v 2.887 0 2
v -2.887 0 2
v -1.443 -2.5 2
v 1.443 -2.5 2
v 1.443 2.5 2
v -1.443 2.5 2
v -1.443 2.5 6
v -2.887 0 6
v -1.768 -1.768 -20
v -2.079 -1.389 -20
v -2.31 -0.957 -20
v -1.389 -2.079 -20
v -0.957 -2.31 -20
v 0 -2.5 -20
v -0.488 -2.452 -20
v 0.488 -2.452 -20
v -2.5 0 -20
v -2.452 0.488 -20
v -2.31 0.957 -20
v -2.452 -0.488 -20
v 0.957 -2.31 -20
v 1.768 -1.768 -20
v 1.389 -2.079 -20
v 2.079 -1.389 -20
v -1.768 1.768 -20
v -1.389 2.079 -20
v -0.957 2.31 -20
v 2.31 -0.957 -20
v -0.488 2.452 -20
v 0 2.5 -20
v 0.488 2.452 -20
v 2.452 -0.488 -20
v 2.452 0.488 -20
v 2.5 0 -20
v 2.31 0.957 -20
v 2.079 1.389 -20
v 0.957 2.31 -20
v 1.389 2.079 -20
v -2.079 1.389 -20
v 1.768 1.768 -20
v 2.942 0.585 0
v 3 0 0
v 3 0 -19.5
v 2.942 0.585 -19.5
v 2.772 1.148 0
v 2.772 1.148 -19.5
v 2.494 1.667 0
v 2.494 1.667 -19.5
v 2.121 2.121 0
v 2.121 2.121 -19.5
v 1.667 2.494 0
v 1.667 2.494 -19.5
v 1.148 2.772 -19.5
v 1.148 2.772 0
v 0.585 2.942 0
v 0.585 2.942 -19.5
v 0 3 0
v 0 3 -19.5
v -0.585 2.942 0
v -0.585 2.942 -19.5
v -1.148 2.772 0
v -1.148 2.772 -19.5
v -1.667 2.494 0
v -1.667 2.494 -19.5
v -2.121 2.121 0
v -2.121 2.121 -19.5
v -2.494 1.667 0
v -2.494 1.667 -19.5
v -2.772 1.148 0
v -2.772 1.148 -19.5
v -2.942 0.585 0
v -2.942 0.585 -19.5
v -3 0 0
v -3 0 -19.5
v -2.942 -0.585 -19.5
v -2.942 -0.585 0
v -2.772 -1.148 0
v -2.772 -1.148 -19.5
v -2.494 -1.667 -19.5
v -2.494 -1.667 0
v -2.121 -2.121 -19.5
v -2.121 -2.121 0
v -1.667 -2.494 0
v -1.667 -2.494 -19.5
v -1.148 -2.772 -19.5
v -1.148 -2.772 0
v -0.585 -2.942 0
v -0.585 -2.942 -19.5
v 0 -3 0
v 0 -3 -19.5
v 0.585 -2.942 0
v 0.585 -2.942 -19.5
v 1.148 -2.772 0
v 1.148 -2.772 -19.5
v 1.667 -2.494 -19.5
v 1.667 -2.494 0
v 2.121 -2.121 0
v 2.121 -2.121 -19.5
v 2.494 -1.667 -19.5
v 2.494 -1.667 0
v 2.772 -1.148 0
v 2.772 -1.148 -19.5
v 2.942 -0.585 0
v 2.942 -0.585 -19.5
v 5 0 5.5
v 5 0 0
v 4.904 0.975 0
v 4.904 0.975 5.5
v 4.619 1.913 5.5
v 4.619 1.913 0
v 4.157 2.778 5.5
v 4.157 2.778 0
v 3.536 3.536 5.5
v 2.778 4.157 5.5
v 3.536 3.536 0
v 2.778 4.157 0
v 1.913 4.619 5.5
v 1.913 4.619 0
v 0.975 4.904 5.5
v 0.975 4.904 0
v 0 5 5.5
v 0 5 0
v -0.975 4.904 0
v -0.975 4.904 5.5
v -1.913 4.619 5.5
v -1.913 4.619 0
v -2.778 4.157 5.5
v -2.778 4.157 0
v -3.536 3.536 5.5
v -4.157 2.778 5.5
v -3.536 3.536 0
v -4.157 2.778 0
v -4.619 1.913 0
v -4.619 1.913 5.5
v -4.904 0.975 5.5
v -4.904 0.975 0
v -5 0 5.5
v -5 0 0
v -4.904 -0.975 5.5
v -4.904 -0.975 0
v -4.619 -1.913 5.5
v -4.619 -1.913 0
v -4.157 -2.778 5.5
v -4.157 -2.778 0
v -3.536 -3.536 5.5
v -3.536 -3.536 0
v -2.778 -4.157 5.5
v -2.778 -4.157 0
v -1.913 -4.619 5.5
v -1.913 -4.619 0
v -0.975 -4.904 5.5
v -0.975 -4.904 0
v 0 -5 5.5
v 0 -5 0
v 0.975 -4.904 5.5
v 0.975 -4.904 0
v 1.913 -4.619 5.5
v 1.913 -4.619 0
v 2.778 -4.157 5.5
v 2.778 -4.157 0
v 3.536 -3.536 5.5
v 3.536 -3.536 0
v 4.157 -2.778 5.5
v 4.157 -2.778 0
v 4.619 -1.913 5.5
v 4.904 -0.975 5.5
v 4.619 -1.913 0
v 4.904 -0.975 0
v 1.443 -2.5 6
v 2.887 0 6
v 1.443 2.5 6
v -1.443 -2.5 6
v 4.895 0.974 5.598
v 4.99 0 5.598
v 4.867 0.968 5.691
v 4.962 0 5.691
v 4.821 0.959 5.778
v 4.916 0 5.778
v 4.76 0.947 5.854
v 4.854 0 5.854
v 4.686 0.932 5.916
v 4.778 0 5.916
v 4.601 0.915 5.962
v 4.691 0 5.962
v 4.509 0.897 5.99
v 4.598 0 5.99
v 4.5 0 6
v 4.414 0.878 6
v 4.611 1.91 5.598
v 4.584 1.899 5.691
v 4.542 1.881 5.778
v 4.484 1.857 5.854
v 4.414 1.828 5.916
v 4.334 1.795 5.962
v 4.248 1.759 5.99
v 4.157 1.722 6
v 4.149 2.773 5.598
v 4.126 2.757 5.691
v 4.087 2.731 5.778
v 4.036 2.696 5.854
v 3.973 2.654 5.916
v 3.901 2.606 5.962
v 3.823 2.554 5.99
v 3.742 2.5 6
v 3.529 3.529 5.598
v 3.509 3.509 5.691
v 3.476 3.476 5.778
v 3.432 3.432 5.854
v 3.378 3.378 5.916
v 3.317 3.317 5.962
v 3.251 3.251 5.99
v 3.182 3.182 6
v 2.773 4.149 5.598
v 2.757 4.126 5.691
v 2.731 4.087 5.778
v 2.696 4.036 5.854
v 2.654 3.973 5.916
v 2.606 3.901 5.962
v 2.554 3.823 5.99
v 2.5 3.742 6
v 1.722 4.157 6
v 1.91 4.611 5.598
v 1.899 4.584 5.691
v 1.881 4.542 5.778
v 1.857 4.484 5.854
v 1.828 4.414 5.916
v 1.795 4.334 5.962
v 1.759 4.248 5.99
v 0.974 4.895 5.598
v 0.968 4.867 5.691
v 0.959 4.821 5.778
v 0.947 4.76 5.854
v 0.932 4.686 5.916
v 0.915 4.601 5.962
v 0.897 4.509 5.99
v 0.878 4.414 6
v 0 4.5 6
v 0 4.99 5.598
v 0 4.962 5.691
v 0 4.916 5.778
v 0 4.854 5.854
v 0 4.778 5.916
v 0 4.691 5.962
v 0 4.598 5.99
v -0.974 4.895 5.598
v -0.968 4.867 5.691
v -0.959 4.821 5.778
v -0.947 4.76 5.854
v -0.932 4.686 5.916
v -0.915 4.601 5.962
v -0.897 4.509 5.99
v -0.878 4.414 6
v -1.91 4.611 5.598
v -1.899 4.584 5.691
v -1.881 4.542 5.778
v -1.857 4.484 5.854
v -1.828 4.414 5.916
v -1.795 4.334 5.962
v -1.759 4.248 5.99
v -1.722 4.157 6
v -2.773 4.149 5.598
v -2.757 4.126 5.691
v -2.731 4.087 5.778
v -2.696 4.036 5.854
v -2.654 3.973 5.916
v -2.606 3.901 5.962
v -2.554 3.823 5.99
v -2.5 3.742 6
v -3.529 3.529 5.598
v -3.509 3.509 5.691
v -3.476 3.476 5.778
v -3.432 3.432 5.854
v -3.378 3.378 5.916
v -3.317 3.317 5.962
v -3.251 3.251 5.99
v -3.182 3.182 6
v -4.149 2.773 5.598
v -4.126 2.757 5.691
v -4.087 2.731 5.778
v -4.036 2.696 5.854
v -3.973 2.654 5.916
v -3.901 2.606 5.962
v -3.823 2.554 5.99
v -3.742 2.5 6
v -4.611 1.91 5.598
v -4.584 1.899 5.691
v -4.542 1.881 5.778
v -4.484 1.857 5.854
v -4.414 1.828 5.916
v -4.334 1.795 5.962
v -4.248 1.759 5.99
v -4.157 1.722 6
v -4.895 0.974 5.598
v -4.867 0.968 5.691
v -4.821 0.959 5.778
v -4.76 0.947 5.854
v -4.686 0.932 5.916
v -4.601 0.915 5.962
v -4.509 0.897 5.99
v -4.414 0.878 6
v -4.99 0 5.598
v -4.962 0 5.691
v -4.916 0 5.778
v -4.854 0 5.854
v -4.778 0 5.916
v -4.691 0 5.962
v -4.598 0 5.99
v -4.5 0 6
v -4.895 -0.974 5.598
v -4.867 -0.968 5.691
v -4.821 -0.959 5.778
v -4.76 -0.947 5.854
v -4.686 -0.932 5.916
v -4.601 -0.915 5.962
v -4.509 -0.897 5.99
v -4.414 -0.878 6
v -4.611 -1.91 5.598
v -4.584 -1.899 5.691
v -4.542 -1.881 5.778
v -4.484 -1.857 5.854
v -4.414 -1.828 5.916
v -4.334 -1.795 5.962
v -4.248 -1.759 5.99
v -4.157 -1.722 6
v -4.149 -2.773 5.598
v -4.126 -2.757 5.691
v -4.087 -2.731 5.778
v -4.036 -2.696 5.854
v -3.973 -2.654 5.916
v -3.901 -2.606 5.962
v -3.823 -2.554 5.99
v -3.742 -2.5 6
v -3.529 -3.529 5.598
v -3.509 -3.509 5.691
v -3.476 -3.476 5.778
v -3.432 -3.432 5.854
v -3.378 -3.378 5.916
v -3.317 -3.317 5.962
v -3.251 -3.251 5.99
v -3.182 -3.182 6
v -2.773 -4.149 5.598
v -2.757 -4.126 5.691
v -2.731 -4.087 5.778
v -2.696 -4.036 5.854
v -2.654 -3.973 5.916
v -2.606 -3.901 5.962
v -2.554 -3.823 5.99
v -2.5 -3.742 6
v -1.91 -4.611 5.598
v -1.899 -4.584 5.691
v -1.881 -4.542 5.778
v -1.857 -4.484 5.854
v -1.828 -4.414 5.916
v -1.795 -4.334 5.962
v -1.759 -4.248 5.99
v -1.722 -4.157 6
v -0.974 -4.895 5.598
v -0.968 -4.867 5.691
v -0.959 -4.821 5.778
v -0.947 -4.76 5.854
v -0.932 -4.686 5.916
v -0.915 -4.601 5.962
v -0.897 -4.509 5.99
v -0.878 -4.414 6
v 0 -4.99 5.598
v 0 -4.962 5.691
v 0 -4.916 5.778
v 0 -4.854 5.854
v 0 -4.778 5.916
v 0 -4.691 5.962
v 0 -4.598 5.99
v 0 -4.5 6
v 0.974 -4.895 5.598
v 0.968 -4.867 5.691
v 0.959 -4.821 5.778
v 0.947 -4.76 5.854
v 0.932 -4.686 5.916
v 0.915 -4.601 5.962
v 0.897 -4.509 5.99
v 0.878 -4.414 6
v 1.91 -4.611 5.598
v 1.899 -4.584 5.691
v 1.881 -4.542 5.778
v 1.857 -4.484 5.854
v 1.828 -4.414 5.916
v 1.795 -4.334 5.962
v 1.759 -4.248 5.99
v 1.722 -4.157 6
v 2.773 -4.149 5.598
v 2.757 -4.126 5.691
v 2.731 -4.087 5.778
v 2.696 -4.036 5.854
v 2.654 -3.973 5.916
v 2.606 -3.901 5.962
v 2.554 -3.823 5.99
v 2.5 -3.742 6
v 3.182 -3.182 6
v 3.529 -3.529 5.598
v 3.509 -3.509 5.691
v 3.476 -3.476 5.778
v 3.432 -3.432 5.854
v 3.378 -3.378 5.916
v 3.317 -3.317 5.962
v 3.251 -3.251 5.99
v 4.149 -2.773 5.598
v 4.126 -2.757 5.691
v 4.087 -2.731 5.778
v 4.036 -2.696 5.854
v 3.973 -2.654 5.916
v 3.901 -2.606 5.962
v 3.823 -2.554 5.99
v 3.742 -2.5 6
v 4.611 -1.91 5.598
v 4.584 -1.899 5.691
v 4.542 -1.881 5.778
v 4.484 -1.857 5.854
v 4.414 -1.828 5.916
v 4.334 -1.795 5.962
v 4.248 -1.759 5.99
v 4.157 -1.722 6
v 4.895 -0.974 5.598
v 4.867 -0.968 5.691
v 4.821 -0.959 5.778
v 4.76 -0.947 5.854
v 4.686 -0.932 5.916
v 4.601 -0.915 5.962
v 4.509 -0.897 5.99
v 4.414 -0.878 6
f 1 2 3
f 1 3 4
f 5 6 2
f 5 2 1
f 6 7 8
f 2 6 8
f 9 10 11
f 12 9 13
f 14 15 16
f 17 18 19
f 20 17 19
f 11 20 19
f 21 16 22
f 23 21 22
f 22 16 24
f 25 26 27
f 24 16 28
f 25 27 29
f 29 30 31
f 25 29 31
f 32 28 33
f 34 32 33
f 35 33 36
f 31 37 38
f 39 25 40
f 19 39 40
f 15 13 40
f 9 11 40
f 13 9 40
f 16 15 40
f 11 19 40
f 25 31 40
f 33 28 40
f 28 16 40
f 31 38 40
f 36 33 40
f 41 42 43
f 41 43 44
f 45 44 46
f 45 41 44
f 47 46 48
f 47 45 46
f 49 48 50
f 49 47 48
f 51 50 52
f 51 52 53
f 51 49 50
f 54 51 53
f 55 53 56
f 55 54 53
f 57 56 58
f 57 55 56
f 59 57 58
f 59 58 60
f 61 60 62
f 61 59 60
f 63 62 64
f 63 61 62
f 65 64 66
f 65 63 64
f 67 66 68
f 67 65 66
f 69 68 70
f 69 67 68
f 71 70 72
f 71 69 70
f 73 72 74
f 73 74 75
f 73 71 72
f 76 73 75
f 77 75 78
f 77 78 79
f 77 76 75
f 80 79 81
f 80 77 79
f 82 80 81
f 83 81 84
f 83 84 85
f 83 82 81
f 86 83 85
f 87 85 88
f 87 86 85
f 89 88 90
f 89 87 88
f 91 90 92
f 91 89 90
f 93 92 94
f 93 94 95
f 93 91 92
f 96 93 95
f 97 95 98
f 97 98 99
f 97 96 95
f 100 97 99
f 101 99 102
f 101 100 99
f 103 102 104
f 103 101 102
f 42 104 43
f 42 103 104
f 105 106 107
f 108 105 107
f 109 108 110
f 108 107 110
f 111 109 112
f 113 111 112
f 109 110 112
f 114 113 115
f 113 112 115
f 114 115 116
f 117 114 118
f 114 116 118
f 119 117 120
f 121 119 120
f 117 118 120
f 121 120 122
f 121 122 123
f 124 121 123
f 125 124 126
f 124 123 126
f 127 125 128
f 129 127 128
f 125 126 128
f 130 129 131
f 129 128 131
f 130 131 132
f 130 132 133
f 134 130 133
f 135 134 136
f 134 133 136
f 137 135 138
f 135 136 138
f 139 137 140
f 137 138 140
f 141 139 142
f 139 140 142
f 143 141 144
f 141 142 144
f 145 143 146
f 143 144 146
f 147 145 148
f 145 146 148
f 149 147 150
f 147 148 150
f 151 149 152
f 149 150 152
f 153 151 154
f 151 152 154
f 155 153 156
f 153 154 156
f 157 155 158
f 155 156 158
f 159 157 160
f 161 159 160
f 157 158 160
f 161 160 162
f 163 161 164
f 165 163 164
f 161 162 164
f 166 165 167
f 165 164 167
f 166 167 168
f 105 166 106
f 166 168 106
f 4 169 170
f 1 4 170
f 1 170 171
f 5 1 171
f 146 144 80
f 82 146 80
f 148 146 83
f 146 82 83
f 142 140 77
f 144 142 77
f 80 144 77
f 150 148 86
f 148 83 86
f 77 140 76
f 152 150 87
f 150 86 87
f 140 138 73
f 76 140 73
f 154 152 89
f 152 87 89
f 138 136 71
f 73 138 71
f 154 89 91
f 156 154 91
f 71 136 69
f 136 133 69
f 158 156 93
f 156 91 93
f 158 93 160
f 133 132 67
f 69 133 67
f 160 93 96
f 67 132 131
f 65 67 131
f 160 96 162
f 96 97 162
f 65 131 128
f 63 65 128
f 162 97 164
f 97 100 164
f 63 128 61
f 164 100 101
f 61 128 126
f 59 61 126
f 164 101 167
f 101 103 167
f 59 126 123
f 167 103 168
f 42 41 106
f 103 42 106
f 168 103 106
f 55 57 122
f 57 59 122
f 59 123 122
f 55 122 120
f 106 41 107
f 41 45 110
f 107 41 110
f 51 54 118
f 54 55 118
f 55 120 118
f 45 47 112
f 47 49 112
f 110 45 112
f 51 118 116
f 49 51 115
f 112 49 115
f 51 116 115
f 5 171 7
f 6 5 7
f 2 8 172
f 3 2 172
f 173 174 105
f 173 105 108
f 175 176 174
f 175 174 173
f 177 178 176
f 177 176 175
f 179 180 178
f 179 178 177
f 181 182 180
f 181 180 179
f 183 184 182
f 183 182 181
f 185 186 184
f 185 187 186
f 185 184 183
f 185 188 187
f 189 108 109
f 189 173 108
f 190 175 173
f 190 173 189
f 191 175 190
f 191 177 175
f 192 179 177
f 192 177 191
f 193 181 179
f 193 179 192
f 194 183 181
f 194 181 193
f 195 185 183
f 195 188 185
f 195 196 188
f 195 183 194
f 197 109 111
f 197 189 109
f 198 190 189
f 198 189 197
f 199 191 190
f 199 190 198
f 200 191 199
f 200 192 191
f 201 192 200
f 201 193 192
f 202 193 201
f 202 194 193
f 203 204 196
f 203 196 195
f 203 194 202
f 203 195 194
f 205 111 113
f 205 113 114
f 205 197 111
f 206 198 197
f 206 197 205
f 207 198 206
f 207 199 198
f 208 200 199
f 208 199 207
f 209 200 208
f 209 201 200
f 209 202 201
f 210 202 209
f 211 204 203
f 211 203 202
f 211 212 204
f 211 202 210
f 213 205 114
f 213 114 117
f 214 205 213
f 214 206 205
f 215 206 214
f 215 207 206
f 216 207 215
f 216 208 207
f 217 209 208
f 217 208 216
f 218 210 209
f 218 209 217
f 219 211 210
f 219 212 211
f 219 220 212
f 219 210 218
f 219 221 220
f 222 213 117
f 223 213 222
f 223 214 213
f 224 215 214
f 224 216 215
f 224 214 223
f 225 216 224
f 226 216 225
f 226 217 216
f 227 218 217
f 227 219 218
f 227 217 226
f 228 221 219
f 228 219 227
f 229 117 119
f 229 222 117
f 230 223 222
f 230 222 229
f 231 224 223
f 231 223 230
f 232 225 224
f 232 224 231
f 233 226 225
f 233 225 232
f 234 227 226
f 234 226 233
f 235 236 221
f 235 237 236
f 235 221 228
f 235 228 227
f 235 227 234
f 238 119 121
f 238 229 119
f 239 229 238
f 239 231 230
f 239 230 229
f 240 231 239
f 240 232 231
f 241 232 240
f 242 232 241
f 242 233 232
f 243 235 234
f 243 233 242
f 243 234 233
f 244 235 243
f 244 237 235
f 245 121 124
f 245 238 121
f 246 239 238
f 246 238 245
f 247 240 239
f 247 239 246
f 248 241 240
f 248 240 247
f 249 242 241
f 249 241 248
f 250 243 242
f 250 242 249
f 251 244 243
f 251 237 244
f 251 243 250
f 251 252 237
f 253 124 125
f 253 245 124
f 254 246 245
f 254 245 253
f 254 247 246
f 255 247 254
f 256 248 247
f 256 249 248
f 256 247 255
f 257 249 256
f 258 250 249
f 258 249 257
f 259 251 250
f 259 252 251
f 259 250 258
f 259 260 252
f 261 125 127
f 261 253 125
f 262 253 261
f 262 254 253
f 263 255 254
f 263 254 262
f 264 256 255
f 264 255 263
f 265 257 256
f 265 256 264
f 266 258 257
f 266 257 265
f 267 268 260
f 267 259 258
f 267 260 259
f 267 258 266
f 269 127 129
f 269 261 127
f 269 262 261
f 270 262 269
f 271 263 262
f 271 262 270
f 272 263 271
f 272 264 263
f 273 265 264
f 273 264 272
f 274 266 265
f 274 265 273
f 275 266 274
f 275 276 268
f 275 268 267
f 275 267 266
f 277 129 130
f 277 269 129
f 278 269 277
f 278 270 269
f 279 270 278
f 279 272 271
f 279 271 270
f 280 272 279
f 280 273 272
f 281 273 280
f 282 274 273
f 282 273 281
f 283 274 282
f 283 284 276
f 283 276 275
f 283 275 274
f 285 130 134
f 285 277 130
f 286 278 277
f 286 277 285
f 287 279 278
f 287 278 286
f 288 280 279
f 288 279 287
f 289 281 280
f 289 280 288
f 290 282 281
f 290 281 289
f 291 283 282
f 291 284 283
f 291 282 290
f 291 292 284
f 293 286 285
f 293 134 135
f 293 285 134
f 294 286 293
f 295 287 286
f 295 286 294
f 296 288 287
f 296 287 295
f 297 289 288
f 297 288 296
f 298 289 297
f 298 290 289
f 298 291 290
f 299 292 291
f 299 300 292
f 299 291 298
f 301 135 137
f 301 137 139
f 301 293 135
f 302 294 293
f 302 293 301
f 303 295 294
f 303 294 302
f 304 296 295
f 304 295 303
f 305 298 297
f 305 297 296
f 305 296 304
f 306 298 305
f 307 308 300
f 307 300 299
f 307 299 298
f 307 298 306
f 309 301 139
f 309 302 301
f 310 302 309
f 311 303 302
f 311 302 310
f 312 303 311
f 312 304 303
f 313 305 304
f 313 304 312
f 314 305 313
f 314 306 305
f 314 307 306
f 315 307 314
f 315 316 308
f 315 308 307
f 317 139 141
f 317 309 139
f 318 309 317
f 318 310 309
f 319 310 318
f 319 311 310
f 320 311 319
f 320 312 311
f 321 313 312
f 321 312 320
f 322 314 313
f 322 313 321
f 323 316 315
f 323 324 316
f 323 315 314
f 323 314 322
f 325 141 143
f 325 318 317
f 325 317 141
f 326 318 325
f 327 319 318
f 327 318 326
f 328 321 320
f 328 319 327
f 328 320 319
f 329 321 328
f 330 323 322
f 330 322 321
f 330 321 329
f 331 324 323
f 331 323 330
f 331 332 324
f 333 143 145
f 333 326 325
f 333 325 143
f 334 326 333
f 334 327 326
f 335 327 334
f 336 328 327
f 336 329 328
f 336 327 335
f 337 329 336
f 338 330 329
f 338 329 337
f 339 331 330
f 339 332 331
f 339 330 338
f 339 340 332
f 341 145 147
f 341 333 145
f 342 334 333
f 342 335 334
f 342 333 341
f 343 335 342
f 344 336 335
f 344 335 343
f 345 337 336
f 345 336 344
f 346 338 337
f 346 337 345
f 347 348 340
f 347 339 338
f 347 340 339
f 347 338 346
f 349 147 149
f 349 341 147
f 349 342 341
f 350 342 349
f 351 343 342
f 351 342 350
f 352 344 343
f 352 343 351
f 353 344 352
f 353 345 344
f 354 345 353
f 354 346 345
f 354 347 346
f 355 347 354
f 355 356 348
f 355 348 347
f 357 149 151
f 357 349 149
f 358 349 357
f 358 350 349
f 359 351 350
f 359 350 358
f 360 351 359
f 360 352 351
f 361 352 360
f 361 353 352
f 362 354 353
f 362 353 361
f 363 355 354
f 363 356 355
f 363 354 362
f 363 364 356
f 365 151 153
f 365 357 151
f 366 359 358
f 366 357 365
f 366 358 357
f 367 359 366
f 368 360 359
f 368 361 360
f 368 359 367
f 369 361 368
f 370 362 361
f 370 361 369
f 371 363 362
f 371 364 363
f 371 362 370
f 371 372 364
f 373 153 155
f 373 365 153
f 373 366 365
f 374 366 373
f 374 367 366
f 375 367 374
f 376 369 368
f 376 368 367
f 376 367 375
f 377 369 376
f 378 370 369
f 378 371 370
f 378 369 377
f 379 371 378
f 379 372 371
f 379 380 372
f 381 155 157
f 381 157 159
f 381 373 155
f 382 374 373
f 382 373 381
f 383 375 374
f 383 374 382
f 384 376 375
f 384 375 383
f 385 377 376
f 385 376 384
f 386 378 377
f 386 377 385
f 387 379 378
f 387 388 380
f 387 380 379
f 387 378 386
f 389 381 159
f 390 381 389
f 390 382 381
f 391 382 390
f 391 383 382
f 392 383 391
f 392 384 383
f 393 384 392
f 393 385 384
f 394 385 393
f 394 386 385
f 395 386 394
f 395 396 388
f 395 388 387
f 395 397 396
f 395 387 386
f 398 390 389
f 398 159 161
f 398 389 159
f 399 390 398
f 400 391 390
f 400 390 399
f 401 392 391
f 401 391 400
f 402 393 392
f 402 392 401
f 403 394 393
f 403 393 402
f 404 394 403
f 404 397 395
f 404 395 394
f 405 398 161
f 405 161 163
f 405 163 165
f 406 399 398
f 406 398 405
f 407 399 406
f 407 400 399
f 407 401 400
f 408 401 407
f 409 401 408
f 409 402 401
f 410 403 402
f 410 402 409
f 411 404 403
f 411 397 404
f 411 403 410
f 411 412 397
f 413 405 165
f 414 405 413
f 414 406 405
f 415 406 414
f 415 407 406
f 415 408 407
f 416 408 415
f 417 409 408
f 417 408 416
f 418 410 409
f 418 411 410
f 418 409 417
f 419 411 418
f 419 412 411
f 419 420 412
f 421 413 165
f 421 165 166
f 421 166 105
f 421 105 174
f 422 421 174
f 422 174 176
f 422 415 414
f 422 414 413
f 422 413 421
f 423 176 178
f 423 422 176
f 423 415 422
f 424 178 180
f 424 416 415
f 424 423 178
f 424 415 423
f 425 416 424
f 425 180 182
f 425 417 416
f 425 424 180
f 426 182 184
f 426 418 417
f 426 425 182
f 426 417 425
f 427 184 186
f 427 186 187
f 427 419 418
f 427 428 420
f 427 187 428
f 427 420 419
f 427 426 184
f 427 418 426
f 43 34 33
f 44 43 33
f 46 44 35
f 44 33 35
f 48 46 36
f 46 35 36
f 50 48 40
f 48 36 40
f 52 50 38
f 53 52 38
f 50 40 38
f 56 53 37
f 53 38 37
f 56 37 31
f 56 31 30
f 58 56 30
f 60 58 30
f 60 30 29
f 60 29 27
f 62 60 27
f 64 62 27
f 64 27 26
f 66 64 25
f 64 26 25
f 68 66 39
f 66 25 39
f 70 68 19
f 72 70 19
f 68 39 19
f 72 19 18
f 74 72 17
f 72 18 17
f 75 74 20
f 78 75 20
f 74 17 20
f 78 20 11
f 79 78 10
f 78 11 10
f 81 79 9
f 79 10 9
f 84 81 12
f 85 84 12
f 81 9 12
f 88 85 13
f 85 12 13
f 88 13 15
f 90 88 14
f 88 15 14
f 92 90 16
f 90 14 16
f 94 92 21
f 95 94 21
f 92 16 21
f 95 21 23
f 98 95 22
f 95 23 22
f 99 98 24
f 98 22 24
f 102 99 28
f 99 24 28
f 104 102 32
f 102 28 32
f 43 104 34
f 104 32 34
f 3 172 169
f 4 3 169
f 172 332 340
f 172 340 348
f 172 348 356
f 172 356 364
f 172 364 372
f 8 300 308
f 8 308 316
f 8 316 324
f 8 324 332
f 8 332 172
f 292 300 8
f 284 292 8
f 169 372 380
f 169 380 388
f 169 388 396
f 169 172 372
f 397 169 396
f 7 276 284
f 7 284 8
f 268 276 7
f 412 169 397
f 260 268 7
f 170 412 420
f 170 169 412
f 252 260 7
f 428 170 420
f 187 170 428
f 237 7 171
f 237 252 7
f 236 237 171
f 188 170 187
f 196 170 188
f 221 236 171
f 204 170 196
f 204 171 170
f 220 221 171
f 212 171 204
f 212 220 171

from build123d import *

# Parameters (mm, degrees)
SKETCH_R     = 5
PAD_DEPTH    = 6
POCKET_DEPTH = 4
SKETCH002_R  = 3
PAD001_DEPTH = 20
FILLET_R     = 0.5
CHAMFER_SIZE = 0.5


with BuildPart() as part:
    # Sketch → Pad (new body)
    with BuildSketch(Plane.XY):
        Circle(SKETCH_R)
    extrude(amount=PAD_DEPTH)

    # Sketch001 (on Face3 of Pad) → Pocket (cut)
    with BuildSketch(Plane.XY.offset(6)):
        Polygon((2.886751, 0), (1.443376, 2.5), (-1.443376, 2.5), (-2.886751, 0), (-1.443376, -2.5), (1.443376, -2.5), align=None)
    extrude(amount=-POCKET_DEPTH, mode=Mode.SUBTRACT)

    # Sketch002 → Pad001 (join)
    with BuildSketch(Plane.XY):
        Circle(SKETCH002_R)
    extrude(amount=-PAD001_DEPTH)

    # Fillet
    fillet_edges = [part.edges().sort_by_distance(p)[0] for p in [
        (-5, 0, 6),
    ]]
    fillet(fillet_edges, radius=FILLET_R)

    # Chamfer
    chamfer_edges = [part.edges().sort_by_distance(p)[0] for p in [
        (-3, 0, -20),
    ]]
    chamfer(chamfer_edges, length=CHAMFER_SIZE)


solid = part.part
